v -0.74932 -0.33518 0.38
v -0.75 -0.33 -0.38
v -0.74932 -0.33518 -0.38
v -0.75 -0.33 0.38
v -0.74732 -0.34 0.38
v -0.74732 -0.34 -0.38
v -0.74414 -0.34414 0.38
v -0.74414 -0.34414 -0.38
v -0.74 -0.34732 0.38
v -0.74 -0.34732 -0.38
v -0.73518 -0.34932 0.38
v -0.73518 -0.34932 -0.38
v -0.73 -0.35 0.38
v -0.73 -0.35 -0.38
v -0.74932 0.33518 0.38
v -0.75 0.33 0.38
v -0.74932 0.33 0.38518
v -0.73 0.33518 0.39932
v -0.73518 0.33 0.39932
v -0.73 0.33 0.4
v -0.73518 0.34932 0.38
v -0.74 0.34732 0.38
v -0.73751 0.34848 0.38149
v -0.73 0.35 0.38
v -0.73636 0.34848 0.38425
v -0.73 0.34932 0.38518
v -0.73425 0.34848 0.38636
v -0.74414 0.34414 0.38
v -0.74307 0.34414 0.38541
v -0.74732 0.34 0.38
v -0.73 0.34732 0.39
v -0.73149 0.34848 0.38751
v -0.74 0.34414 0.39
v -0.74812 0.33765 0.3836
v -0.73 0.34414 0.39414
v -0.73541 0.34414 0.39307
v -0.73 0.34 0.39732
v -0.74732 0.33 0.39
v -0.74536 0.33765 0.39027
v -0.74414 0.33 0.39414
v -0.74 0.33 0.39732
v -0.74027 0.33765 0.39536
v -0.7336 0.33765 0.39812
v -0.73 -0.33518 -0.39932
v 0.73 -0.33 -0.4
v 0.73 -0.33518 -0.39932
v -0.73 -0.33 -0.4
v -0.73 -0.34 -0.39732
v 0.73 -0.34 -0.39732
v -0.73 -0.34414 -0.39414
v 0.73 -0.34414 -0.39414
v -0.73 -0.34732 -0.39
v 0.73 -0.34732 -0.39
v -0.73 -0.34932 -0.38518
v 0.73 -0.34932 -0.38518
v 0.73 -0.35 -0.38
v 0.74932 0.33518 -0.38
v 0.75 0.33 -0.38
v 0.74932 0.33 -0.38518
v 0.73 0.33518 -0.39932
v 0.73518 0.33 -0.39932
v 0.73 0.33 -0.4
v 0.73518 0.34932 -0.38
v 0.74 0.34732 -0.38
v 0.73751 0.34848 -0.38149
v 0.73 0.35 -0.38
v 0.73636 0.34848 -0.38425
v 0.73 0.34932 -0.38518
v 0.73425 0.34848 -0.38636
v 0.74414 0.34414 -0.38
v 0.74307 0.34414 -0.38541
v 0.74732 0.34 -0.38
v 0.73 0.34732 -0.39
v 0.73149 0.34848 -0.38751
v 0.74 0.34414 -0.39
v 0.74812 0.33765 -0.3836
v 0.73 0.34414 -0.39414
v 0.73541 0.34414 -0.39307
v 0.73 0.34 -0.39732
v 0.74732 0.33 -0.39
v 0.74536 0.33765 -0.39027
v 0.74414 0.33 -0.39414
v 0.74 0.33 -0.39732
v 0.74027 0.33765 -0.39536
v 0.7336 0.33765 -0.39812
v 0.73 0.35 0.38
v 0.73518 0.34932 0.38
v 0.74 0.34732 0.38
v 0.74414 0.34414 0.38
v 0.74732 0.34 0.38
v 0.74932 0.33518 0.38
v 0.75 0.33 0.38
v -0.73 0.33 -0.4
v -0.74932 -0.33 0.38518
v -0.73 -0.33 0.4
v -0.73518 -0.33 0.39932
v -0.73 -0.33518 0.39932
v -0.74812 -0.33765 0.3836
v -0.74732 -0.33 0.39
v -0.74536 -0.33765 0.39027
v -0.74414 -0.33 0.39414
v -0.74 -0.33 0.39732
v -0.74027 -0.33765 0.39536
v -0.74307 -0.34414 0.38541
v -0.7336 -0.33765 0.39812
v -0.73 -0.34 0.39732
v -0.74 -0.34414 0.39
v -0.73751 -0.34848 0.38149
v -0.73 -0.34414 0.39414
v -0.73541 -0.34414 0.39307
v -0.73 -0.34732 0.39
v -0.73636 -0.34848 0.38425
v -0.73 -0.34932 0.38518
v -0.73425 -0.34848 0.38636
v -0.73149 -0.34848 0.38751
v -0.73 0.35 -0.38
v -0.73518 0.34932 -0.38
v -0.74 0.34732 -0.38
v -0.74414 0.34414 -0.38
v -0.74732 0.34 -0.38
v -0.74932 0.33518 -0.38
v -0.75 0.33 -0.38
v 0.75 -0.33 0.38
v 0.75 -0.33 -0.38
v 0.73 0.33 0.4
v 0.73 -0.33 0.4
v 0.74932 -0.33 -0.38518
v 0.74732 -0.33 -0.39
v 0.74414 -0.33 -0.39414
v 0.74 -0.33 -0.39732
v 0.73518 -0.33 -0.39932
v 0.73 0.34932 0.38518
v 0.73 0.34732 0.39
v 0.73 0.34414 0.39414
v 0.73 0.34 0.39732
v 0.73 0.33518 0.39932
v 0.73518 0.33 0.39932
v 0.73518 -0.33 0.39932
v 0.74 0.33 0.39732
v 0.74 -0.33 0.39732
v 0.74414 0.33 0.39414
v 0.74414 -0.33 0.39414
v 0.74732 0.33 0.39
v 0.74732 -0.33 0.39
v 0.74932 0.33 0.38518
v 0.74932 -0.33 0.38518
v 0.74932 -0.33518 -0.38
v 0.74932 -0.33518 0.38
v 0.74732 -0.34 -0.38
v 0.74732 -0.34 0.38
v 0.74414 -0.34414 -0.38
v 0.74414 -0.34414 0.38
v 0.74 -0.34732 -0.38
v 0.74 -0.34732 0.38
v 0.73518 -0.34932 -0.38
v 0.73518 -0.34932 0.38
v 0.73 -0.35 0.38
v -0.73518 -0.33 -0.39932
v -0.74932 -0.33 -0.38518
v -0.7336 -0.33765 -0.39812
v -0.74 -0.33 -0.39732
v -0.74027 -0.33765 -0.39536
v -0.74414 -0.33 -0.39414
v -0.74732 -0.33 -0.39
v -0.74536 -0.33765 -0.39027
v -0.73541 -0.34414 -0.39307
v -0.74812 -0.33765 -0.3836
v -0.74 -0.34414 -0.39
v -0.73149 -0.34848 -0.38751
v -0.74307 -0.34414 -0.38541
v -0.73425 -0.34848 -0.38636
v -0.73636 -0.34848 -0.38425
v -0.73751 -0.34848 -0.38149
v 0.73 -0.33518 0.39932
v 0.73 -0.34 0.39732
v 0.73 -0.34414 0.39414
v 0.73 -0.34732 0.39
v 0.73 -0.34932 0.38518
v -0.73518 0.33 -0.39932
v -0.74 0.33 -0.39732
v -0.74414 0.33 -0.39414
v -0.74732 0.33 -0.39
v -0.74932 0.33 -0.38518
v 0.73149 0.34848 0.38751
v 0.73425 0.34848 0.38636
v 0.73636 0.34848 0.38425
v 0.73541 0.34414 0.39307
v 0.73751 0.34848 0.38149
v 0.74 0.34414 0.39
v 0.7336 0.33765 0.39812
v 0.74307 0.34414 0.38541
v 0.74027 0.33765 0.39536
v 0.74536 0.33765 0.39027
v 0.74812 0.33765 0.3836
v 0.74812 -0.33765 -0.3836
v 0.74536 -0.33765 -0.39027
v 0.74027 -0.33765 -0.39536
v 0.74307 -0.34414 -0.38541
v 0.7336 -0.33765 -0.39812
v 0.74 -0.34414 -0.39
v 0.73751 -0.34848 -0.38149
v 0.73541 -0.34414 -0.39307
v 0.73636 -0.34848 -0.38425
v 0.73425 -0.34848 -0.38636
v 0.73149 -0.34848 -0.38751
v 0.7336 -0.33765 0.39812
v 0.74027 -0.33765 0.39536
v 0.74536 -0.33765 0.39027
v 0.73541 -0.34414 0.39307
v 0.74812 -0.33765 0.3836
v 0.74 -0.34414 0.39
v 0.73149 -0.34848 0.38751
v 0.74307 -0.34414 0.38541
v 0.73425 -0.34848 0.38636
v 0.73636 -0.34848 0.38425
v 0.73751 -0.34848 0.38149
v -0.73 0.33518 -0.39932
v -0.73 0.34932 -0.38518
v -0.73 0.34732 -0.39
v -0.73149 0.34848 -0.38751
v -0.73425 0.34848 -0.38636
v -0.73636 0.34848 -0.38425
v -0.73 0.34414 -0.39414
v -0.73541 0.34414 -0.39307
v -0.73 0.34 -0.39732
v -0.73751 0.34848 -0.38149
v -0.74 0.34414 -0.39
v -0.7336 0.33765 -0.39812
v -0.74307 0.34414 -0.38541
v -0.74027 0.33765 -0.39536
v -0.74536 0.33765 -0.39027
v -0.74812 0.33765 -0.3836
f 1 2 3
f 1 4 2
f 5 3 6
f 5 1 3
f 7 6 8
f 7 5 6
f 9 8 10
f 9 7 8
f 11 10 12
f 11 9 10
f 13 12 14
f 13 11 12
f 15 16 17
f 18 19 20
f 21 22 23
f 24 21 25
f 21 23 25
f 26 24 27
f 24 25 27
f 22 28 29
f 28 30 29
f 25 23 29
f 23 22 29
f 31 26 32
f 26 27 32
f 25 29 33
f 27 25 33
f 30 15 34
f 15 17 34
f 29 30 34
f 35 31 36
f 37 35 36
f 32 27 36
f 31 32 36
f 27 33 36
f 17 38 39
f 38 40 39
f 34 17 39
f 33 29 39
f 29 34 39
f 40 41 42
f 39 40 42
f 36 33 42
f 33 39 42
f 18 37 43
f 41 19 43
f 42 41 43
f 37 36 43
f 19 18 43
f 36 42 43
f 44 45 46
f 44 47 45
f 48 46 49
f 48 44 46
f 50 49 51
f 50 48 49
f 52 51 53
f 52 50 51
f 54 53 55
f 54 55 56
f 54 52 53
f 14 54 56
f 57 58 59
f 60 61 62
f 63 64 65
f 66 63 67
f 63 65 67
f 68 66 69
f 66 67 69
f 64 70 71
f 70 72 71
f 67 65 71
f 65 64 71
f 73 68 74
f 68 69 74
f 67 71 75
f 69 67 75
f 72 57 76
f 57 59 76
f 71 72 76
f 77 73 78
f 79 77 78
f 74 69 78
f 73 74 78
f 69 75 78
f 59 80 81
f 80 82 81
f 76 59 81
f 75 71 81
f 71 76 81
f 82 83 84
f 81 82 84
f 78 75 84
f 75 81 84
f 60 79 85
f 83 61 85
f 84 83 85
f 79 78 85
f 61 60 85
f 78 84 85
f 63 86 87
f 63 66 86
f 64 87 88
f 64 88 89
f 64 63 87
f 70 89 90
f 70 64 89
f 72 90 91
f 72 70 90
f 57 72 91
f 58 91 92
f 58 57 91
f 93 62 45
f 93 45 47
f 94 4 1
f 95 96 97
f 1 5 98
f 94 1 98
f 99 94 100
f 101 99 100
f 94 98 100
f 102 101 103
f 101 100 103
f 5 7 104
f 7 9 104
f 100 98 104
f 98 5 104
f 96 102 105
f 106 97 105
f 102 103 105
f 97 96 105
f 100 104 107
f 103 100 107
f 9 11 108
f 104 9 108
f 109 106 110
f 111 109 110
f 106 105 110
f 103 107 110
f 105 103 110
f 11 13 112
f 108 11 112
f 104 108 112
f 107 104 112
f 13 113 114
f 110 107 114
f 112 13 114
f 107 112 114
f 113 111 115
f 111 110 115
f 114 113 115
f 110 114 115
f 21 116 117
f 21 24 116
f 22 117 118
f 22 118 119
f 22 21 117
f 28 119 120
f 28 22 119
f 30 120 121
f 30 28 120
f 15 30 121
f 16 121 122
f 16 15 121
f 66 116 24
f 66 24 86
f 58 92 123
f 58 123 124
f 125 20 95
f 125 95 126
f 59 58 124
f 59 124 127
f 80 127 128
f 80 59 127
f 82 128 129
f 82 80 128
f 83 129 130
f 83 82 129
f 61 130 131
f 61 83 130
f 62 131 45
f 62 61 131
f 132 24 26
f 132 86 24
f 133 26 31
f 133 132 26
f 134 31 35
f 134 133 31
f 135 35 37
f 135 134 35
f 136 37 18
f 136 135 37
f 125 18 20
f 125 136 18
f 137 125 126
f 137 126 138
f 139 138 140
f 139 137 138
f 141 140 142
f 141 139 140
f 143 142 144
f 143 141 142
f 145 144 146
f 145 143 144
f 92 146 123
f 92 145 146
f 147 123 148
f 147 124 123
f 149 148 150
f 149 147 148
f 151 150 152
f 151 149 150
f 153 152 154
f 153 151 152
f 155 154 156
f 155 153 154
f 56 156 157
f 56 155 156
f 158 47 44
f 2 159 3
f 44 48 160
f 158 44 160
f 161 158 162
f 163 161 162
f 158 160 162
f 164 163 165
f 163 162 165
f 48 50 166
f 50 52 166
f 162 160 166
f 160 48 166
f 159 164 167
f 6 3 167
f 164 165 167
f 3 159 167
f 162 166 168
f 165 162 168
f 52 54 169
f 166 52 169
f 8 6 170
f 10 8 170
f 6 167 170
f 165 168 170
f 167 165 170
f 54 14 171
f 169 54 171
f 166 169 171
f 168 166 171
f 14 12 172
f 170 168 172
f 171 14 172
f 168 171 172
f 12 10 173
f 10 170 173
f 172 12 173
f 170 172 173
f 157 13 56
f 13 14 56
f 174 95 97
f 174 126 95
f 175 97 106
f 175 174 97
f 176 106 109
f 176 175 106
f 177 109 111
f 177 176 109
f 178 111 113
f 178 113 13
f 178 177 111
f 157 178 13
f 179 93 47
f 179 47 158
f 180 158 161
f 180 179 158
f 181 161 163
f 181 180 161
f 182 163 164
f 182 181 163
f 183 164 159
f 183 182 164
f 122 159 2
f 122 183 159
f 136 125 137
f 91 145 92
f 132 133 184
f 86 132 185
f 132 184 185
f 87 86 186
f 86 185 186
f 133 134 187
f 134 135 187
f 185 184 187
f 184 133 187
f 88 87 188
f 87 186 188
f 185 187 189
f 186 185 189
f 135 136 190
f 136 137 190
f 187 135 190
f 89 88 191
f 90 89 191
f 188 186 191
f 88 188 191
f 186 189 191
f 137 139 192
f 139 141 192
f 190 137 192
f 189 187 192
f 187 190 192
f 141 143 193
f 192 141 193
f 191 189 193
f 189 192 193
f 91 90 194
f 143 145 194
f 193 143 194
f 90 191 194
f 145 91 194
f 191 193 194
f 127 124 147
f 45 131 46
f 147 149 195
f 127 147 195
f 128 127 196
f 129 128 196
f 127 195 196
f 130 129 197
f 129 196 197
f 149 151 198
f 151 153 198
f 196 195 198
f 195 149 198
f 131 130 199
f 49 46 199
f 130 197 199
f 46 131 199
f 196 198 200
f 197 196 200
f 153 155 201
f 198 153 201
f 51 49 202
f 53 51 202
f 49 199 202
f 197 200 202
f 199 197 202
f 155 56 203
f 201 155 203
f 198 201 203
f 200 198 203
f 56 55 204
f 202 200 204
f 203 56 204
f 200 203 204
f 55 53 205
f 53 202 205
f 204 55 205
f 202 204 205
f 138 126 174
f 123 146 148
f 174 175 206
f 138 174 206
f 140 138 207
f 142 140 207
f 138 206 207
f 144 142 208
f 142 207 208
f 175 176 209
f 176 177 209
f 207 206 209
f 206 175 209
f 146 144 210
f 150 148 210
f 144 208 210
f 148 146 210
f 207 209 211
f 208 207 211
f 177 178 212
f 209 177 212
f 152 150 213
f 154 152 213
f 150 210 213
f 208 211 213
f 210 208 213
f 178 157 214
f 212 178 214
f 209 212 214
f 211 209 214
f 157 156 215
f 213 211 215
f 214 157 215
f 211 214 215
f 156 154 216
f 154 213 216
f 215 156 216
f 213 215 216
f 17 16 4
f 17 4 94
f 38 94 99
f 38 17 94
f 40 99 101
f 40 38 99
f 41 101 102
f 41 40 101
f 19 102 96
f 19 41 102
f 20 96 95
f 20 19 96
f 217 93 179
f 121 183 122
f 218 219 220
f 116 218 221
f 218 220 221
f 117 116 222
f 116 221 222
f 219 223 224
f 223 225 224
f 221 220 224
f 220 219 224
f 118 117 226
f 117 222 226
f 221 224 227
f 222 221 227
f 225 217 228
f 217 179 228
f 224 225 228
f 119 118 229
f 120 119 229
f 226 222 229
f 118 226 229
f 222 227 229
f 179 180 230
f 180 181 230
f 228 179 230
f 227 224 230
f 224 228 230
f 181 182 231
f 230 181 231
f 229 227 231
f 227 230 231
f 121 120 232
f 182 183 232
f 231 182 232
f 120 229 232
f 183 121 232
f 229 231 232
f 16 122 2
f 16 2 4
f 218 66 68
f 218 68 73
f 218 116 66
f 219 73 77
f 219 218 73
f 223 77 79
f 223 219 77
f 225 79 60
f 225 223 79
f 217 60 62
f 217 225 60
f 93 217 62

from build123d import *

# Parameters (mm, degrees)
BOSS_EXTRUDE1_DEPTH = 0.35
FILLET2_R           = 0.02


with BuildPart() as part:
    # Sketch1 → Boss-Extrude1 (new body, symmetric)
    with BuildSketch(Plane(origin=(0, 0, 0), x_dir=(1, 0, 0), z_dir=(0, 1, 0))):
        with BuildLine():
            Line((-0.73, -0.4), (0.73, -0.4))
            ThreePointArc((0.73, -0.4), (0.744142136, -0.394142136), (0.75, -0.38))
            Line((0.75, -0.38), (0.75, 0.38))
            ThreePointArc((0.75, 0.38), (0.744142136, 0.394142136), (0.73, 0.4))
            Line((0.73, 0.4), (-0.73, 0.4))
            ThreePointArc((-0.73, 0.4), (-0.744142136, 0.394142136), (-0.75, 0.38))
            Line((-0.75, 0.38), (-0.75, -0.38))
            ThreePointArc((-0.75, -0.38), (-0.744142136, -0.394142136), (-0.73, -0.4))
        make_face()
    extrude(amount=BOSS_EXTRUDE1_DEPTH, both=True)

    # Fillet2
    fillet2_edges = [part.edges().sort_by_distance(p)[0] for p in [
        (0.744142136, 0.35, 0.394142136),
        (0, -0.35, 0.4),
        (-0.744142136, -0.35, 0.394142136),
        (0.75, 0.35, 0),
        (0.744142136, 0.35, -0.394142136),
        (0, 0.35, -0.4),
        (-0.744142136, 0.35, -0.394142136),
        (-0.75, 0.35, 0),
        (0, 0.35, 0.4),
        (0, 0.35, -0.4),
        (0, 0.35, -0.4),
        (0, 0.35, 0.4),
        (0, -0.35, 0.4),
        (0, -0.35, 0.4),
        (0, -0.35, -0.4),
        (0, -0.35, -0.4),
        (-0.744142136, 0.35, 0.394142136),
        (0, 0.35, 0.4),
        (-0.75, -0.35, 0),
        (-0.744142136, -0.35, -0.394142136),
        (0, -0.35, -0.4),
        (0.744142136, -0.35, -0.394142136),
        (0.75, -0.35, 0),
        (0.744142136, -0.35, 0.394142136),
    ]]
    fillet(fillet2_edges, radius=FILLET2_R)


solid = part.part
